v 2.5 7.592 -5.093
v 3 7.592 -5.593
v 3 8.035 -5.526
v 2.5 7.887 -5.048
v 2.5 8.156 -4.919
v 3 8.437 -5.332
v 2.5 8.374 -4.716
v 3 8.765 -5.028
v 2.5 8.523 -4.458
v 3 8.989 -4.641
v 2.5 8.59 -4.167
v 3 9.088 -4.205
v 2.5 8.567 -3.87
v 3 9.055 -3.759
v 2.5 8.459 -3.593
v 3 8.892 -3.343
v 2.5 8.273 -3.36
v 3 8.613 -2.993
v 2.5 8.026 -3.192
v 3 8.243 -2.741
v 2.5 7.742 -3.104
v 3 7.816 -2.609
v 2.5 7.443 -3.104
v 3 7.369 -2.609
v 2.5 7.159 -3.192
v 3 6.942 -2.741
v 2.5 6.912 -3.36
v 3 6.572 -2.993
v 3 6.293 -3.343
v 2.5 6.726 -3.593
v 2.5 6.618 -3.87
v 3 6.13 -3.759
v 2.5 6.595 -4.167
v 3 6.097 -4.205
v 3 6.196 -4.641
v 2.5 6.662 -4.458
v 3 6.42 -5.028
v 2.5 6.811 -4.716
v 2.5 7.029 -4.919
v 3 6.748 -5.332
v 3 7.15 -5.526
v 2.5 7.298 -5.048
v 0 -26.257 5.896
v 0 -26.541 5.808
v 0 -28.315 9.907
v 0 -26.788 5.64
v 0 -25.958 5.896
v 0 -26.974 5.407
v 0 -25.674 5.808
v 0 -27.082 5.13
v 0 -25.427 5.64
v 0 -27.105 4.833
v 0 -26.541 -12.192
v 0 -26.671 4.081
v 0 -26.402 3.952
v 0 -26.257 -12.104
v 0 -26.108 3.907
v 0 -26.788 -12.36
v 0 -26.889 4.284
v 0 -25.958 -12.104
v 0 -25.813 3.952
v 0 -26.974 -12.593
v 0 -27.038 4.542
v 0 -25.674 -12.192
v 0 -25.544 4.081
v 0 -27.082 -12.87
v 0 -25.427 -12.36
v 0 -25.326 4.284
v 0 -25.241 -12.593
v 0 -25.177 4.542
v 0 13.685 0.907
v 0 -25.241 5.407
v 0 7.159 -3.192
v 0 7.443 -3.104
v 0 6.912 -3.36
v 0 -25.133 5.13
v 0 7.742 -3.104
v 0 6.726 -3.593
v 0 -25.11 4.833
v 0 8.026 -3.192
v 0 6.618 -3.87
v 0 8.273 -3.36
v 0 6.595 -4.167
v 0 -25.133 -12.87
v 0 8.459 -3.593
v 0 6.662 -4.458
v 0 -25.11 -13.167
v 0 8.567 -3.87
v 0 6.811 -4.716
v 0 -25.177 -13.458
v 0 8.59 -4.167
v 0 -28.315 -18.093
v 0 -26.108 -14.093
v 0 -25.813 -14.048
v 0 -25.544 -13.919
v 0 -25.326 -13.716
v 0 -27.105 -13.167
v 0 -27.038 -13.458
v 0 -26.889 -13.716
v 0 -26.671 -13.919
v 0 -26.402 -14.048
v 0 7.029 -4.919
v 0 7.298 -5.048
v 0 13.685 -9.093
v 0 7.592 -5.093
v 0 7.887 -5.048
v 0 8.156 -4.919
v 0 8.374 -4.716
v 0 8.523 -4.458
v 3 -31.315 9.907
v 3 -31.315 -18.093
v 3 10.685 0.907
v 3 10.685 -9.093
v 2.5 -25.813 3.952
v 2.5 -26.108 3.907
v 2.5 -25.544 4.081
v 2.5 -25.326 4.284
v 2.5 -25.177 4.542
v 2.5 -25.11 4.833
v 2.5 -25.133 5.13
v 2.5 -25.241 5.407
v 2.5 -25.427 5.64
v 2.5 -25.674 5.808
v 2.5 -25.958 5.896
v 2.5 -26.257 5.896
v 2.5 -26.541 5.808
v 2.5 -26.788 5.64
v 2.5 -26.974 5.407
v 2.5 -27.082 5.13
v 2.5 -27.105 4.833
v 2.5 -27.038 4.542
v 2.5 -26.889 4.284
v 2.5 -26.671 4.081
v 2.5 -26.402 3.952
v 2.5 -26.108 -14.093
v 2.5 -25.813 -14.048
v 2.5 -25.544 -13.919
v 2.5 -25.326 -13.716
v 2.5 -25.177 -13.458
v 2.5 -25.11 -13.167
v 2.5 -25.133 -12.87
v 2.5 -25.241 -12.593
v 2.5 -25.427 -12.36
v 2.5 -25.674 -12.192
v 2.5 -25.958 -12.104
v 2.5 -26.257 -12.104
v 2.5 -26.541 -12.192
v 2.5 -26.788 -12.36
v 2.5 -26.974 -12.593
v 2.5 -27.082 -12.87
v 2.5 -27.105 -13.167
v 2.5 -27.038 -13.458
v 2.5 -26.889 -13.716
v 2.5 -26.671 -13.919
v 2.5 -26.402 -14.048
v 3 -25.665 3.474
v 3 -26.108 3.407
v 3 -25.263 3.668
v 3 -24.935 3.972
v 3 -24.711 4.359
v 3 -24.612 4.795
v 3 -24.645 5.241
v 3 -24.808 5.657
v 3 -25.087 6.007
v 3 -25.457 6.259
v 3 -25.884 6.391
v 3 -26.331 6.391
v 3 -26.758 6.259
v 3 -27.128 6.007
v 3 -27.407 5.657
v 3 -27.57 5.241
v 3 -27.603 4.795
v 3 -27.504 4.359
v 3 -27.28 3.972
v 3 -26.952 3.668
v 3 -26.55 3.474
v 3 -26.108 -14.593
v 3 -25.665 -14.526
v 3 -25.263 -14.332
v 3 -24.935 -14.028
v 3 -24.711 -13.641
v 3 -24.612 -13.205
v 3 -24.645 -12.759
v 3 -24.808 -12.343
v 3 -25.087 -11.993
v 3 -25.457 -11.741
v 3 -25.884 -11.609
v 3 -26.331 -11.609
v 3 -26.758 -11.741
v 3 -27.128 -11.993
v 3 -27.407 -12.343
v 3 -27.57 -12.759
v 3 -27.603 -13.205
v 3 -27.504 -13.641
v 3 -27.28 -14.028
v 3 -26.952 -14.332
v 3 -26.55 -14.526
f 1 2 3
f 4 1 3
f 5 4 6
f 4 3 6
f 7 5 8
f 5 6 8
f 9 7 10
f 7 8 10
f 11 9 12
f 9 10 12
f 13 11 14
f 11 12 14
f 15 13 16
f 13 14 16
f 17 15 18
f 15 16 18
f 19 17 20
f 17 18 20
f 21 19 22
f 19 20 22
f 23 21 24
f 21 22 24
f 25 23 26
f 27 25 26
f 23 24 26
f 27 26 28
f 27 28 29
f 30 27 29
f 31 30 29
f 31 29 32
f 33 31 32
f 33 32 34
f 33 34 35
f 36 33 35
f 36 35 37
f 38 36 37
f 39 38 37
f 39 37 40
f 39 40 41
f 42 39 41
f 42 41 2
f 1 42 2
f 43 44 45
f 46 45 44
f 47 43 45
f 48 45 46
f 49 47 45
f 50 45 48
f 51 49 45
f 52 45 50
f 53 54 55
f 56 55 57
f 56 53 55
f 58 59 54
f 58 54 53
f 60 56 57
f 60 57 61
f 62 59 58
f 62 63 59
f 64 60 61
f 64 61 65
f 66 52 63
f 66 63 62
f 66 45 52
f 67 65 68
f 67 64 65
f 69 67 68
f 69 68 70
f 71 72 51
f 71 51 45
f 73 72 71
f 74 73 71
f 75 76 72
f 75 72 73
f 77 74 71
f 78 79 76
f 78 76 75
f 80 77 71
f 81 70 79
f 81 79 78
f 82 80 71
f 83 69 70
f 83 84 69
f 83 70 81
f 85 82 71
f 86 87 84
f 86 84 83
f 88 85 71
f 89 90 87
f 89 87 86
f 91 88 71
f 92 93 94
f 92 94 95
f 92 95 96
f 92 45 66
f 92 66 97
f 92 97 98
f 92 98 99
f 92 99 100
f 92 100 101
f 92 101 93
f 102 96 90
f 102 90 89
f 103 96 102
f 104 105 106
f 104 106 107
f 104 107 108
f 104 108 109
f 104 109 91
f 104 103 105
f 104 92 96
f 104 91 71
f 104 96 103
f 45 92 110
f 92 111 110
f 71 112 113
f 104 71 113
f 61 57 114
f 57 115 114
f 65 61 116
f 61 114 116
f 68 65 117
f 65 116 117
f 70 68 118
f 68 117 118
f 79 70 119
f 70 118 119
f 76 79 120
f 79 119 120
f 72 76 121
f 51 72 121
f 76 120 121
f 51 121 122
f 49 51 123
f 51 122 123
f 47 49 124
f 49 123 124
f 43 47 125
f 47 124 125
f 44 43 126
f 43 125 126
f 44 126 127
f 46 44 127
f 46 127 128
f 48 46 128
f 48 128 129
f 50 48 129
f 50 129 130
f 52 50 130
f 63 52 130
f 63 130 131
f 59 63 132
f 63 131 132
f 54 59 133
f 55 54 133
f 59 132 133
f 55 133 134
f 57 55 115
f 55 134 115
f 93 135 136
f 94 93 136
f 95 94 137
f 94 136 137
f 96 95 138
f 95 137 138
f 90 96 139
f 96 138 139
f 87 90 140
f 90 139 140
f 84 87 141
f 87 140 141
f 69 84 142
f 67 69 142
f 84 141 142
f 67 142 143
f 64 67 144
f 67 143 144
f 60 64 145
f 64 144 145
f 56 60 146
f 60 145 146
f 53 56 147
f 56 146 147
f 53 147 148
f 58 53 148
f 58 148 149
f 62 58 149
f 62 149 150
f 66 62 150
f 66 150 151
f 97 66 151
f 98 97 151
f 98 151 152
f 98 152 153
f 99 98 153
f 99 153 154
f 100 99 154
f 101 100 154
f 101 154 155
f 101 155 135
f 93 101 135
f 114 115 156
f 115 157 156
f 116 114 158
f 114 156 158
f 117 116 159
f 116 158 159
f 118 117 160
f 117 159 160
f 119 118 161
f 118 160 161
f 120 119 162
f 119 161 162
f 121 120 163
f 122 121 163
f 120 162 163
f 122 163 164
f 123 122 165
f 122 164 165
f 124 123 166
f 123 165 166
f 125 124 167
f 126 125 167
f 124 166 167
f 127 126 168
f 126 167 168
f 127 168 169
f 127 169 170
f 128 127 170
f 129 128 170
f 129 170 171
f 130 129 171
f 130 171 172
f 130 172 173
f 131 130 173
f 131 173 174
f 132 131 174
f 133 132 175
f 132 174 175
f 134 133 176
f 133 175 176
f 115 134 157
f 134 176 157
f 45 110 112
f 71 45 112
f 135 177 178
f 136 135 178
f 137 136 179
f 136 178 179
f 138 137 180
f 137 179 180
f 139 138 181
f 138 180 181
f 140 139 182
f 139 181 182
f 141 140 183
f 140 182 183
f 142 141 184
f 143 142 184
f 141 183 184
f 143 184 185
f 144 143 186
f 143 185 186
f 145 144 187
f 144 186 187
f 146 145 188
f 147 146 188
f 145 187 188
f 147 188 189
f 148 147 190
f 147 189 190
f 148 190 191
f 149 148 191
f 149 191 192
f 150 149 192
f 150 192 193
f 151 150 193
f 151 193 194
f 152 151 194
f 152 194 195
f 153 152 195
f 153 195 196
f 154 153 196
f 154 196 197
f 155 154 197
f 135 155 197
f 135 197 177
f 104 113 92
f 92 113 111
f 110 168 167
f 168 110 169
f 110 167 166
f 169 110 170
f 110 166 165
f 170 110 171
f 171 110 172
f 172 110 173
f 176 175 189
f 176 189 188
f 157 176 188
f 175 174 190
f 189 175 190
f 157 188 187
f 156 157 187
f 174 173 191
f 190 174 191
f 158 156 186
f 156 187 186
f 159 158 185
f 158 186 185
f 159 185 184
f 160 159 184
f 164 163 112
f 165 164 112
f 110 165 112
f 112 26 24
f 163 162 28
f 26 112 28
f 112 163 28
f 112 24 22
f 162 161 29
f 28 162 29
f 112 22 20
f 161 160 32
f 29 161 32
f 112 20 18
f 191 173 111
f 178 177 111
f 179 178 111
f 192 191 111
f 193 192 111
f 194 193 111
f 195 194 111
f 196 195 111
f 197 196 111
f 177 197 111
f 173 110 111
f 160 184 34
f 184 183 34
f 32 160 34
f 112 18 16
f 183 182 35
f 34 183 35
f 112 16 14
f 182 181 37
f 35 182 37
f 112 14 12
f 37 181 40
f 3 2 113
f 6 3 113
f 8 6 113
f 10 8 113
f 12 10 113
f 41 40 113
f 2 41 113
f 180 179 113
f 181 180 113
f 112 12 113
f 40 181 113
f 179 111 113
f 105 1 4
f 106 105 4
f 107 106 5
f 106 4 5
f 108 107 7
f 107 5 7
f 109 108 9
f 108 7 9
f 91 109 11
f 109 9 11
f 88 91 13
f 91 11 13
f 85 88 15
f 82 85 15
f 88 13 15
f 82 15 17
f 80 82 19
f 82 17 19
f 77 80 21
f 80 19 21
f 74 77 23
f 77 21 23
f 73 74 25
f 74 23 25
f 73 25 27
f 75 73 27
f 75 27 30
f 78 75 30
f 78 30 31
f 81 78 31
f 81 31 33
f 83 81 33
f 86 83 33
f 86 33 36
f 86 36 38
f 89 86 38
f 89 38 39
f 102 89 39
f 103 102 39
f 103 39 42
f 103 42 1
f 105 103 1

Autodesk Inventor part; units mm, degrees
sketch "Sketch1" plane through (0, 0, 0) normal (1, 0, 0) x (0, 1, 0)
  line L0 (-28.3154, 9.9073) -> (-28.3154, -18.0927)
  line L1 (13.6846, -4.0927) -> (13.6846, -9.0927)
  line L2 (13.6846, -4.0927) -> (13.6846, 0.9073)
  line L3 (-28.3154, 9.9073) -> (13.6846, 0.9073)
  line L4 (-28.3154, -18.0927) -> (13.6846, -9.0927)
  point P0 (0, 0)
ref_plane "Work Plane2" through (1, 0, 0) normal (1, 0, 0) x (0, 1, 0)
sketch "Sketch5" plane through (1, 0, 0) normal (1, 0, 0) x (0, 1, 0)
  line L0 (-29.3154, 9.9073) -> (12.6846, 0.9073)
  line L1 (12.6846, -4.0927) -> (12.6846, 0.9073)
  line L2 (12.6846, -4.0927) -> (12.6846, -9.0927)
  line L3 (-29.3154, -18.0927) -> (12.6846, -9.0927)
  line L4 (-29.3154, 9.9073) -> (-29.3154, -18.0927)
  point P0 (0, 0)
loft "Loft1" add profiles "Sketch1", "Sketch5"
ref_plane "Work Plane8" through (2, 0, 0) normal (1, 0, 0) x (0, 1, 0)
sketch "Sketch8" plane through (2, 0, 0) normal (1, 0, 0) x (0, 1, 0)
  line L0 (-30.3154, 9.9073) -> (11.6846, 0.9073)
  line L1 (11.6846, -9.0927) -> (-30.3154, -18.0927)
  line L2 (-30.3154, -18.0927) -> (-30.3154, 9.9073)
  line L3 (11.6846, 0.9073) -> (11.6846, -9.0927)
  point P0 (0, 0)
loft "Loft2" add profiles "Sketch8" section 1 edges at (1, -29.3154, -4.0927) (1, -8.3154, -13.5927) (1, 12.6846, -6.5927) (1, 12.6846, -1.5927) (1, -8.3154, 5.4073)
ref_plane "Work Plane6" through (3, 0, 0) normal (1, 0, 0) x (0, 1, 0)
sketch "Sketch9" plane through (3, 0, 0) normal (1, 0, 0) x (0, 1, 0)
  line L0 (-31.3154, 9.9073) -> (-31.3154, -18.0927)
  line L1 (-31.3154, -18.0927) -> (10.6846, -9.0927)
  line L2 (10.6846, -9.0927) -> (10.6846, 0.9073)
  line L3 (10.6846, 0.9073) -> (-31.3154, 9.9073)
  line L4 (11.6846, -9.0927) -> (11.6846, 0.9073) projected
  point P0 (-1, 0)
loft "Loft3" add profiles "Sketch9" section 1 edges at (2, -30.3154, -4.0927) (2, -9.3154, -13.5927) (2, 11.6846, -4.0927) (2, -9.3154, 5.4073)
sketch "Sketch10" plane through (3, -31.3154, 9.9073) normal (1, 0, 0) x (0, 0, -1)
  circle A0 centre (5, 5.2079) radius 1
  circle A1 centre (23, 5.2079) radius 1
  circle A2 centre (14, 38.9079) radius 1
  point P0 (9.9073, 31.3154)
  dimension "d36" = 33.7
  dimension "d37" = 33.7
  dimension "d38" = 18
  dimension "d39" = 9
extrude "Extrusion1" cut sketch "Sketch10" against normal blind 3
chamfer "Chamfer1" distance 0.5 angle 45 1 edges at (3, -26.1075, 5.9073)
chamfer "Chamfer2" distance 0.5 angle 45 2 edges at (3, -26.1075, -12.0927) (3, 7.5925, -3.0927)
properties part number "triangular"
